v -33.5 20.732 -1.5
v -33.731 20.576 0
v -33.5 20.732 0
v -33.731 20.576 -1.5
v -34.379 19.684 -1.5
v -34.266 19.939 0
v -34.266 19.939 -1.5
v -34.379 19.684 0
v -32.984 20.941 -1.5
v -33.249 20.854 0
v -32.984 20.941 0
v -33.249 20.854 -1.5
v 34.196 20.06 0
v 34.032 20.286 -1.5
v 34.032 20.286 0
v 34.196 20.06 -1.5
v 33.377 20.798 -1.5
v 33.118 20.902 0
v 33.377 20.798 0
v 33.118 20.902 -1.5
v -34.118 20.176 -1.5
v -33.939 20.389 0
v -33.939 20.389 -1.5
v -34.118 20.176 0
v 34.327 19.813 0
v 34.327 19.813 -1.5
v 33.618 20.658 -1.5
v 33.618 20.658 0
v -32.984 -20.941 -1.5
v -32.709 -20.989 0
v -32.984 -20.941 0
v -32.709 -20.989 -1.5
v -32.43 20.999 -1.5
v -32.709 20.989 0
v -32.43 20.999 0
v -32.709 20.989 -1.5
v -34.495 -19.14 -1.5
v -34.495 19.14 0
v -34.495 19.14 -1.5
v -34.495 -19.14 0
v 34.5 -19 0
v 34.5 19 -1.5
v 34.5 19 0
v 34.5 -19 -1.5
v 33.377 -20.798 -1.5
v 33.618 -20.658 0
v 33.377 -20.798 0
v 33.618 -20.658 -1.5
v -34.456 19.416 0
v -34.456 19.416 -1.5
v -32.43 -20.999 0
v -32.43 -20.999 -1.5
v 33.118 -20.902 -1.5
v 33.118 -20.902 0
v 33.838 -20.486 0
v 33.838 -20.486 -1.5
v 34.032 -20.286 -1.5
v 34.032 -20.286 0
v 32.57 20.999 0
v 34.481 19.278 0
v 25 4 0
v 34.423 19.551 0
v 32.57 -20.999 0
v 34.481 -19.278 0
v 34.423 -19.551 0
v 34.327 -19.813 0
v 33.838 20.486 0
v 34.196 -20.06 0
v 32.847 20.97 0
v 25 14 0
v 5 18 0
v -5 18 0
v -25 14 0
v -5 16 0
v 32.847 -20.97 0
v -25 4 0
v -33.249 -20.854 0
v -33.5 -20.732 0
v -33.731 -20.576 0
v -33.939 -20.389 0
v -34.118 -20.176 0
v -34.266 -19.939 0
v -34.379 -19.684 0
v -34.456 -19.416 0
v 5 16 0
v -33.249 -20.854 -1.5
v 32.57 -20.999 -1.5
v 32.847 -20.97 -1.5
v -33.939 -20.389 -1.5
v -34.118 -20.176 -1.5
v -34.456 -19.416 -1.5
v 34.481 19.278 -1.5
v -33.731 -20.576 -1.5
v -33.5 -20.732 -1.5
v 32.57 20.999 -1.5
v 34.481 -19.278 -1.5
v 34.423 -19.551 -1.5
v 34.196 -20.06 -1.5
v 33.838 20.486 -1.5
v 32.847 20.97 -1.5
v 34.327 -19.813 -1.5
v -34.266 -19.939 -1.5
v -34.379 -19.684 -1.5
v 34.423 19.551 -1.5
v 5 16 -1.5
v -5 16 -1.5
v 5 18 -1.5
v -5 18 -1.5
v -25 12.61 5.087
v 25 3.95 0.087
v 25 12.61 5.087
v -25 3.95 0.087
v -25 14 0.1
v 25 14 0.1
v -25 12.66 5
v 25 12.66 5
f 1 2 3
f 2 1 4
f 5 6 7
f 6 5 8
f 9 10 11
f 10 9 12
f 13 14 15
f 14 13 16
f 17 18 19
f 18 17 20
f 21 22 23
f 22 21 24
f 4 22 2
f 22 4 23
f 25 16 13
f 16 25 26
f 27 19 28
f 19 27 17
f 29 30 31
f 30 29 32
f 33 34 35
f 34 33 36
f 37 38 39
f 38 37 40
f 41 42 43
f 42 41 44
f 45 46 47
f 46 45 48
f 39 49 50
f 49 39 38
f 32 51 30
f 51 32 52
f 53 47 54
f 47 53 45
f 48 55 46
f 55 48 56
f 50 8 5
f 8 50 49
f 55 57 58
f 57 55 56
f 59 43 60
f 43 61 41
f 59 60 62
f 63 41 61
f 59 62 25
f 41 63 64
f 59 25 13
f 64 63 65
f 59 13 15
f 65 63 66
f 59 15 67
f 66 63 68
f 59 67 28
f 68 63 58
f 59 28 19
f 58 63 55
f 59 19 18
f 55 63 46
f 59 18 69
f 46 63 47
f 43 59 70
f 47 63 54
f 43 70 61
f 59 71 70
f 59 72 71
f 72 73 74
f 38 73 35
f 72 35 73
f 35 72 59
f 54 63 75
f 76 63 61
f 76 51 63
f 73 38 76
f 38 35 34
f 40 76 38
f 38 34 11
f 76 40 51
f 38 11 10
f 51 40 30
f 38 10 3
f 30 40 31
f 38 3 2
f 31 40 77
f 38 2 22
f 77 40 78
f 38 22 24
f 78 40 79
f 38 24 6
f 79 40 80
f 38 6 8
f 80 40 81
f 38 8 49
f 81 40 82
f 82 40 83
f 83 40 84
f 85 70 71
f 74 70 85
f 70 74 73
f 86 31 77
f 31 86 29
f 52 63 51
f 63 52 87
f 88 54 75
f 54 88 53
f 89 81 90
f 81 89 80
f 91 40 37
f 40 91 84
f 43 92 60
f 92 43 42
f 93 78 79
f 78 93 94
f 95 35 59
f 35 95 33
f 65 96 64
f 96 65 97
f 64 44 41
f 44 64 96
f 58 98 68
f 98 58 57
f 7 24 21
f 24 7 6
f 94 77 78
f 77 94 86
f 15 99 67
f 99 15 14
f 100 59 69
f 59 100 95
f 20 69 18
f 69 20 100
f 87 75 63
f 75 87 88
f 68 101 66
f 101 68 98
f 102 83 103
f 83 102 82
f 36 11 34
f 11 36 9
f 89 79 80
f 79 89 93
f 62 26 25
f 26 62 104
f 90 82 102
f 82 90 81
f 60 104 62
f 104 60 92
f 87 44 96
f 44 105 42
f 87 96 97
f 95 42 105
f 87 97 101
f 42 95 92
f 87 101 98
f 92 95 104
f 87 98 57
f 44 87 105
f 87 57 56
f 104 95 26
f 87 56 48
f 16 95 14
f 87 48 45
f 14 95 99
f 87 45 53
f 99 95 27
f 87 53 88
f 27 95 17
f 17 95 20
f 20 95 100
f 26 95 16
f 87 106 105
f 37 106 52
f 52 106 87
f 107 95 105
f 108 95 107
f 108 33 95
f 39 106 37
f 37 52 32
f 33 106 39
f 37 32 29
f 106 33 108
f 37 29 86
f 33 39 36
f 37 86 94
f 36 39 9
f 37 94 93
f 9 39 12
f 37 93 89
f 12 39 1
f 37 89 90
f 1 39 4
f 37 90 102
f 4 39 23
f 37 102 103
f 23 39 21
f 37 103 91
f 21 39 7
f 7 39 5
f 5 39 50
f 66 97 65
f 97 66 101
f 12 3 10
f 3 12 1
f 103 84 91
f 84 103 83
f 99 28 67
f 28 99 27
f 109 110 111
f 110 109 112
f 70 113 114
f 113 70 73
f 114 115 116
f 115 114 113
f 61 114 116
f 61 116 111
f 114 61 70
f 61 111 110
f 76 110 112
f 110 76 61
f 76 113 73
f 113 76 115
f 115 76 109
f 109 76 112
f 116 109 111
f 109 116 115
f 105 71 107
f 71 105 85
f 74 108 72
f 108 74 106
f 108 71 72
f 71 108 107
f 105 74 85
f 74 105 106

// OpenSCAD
$fn=45;
corner=2;
base_x=69;
base_y=42;
base_z=1.5;

led_x=50;
led_y=10;

led_angle=30;

led_offset=9;

wire_x=10;
wire_y=2;

wire_to_edge=3;


module body() {
    minkowski() {
        translate([0,0,-base_z/4*3])
        cube([base_x-corner*2,base_y-corner*2,base_z/2],center=true);
        cylinder(r=corner,h=base_z/2);
    }
}

module place_led(angle=0) {
        translate([0,-led_y/2+led_offset,0])
        rotate([angle,0,0])
        translate([-led_x/2,0,0])
        children();
}
pad=0.1;

module led() {
    hull() {
        place_led(led_angle)
        cube([led_x,led_y,pad]);
        place_led()
        cube([led_x,led_y,pad]);
    }
}

module positive() {
    body();
    led();
}

difference() {
    positive();
    translate([0,base_y/2-wire_y/2-wire_to_edge,0])
    cube([wire_x,wire_y,base_z*3],center=true);
}
